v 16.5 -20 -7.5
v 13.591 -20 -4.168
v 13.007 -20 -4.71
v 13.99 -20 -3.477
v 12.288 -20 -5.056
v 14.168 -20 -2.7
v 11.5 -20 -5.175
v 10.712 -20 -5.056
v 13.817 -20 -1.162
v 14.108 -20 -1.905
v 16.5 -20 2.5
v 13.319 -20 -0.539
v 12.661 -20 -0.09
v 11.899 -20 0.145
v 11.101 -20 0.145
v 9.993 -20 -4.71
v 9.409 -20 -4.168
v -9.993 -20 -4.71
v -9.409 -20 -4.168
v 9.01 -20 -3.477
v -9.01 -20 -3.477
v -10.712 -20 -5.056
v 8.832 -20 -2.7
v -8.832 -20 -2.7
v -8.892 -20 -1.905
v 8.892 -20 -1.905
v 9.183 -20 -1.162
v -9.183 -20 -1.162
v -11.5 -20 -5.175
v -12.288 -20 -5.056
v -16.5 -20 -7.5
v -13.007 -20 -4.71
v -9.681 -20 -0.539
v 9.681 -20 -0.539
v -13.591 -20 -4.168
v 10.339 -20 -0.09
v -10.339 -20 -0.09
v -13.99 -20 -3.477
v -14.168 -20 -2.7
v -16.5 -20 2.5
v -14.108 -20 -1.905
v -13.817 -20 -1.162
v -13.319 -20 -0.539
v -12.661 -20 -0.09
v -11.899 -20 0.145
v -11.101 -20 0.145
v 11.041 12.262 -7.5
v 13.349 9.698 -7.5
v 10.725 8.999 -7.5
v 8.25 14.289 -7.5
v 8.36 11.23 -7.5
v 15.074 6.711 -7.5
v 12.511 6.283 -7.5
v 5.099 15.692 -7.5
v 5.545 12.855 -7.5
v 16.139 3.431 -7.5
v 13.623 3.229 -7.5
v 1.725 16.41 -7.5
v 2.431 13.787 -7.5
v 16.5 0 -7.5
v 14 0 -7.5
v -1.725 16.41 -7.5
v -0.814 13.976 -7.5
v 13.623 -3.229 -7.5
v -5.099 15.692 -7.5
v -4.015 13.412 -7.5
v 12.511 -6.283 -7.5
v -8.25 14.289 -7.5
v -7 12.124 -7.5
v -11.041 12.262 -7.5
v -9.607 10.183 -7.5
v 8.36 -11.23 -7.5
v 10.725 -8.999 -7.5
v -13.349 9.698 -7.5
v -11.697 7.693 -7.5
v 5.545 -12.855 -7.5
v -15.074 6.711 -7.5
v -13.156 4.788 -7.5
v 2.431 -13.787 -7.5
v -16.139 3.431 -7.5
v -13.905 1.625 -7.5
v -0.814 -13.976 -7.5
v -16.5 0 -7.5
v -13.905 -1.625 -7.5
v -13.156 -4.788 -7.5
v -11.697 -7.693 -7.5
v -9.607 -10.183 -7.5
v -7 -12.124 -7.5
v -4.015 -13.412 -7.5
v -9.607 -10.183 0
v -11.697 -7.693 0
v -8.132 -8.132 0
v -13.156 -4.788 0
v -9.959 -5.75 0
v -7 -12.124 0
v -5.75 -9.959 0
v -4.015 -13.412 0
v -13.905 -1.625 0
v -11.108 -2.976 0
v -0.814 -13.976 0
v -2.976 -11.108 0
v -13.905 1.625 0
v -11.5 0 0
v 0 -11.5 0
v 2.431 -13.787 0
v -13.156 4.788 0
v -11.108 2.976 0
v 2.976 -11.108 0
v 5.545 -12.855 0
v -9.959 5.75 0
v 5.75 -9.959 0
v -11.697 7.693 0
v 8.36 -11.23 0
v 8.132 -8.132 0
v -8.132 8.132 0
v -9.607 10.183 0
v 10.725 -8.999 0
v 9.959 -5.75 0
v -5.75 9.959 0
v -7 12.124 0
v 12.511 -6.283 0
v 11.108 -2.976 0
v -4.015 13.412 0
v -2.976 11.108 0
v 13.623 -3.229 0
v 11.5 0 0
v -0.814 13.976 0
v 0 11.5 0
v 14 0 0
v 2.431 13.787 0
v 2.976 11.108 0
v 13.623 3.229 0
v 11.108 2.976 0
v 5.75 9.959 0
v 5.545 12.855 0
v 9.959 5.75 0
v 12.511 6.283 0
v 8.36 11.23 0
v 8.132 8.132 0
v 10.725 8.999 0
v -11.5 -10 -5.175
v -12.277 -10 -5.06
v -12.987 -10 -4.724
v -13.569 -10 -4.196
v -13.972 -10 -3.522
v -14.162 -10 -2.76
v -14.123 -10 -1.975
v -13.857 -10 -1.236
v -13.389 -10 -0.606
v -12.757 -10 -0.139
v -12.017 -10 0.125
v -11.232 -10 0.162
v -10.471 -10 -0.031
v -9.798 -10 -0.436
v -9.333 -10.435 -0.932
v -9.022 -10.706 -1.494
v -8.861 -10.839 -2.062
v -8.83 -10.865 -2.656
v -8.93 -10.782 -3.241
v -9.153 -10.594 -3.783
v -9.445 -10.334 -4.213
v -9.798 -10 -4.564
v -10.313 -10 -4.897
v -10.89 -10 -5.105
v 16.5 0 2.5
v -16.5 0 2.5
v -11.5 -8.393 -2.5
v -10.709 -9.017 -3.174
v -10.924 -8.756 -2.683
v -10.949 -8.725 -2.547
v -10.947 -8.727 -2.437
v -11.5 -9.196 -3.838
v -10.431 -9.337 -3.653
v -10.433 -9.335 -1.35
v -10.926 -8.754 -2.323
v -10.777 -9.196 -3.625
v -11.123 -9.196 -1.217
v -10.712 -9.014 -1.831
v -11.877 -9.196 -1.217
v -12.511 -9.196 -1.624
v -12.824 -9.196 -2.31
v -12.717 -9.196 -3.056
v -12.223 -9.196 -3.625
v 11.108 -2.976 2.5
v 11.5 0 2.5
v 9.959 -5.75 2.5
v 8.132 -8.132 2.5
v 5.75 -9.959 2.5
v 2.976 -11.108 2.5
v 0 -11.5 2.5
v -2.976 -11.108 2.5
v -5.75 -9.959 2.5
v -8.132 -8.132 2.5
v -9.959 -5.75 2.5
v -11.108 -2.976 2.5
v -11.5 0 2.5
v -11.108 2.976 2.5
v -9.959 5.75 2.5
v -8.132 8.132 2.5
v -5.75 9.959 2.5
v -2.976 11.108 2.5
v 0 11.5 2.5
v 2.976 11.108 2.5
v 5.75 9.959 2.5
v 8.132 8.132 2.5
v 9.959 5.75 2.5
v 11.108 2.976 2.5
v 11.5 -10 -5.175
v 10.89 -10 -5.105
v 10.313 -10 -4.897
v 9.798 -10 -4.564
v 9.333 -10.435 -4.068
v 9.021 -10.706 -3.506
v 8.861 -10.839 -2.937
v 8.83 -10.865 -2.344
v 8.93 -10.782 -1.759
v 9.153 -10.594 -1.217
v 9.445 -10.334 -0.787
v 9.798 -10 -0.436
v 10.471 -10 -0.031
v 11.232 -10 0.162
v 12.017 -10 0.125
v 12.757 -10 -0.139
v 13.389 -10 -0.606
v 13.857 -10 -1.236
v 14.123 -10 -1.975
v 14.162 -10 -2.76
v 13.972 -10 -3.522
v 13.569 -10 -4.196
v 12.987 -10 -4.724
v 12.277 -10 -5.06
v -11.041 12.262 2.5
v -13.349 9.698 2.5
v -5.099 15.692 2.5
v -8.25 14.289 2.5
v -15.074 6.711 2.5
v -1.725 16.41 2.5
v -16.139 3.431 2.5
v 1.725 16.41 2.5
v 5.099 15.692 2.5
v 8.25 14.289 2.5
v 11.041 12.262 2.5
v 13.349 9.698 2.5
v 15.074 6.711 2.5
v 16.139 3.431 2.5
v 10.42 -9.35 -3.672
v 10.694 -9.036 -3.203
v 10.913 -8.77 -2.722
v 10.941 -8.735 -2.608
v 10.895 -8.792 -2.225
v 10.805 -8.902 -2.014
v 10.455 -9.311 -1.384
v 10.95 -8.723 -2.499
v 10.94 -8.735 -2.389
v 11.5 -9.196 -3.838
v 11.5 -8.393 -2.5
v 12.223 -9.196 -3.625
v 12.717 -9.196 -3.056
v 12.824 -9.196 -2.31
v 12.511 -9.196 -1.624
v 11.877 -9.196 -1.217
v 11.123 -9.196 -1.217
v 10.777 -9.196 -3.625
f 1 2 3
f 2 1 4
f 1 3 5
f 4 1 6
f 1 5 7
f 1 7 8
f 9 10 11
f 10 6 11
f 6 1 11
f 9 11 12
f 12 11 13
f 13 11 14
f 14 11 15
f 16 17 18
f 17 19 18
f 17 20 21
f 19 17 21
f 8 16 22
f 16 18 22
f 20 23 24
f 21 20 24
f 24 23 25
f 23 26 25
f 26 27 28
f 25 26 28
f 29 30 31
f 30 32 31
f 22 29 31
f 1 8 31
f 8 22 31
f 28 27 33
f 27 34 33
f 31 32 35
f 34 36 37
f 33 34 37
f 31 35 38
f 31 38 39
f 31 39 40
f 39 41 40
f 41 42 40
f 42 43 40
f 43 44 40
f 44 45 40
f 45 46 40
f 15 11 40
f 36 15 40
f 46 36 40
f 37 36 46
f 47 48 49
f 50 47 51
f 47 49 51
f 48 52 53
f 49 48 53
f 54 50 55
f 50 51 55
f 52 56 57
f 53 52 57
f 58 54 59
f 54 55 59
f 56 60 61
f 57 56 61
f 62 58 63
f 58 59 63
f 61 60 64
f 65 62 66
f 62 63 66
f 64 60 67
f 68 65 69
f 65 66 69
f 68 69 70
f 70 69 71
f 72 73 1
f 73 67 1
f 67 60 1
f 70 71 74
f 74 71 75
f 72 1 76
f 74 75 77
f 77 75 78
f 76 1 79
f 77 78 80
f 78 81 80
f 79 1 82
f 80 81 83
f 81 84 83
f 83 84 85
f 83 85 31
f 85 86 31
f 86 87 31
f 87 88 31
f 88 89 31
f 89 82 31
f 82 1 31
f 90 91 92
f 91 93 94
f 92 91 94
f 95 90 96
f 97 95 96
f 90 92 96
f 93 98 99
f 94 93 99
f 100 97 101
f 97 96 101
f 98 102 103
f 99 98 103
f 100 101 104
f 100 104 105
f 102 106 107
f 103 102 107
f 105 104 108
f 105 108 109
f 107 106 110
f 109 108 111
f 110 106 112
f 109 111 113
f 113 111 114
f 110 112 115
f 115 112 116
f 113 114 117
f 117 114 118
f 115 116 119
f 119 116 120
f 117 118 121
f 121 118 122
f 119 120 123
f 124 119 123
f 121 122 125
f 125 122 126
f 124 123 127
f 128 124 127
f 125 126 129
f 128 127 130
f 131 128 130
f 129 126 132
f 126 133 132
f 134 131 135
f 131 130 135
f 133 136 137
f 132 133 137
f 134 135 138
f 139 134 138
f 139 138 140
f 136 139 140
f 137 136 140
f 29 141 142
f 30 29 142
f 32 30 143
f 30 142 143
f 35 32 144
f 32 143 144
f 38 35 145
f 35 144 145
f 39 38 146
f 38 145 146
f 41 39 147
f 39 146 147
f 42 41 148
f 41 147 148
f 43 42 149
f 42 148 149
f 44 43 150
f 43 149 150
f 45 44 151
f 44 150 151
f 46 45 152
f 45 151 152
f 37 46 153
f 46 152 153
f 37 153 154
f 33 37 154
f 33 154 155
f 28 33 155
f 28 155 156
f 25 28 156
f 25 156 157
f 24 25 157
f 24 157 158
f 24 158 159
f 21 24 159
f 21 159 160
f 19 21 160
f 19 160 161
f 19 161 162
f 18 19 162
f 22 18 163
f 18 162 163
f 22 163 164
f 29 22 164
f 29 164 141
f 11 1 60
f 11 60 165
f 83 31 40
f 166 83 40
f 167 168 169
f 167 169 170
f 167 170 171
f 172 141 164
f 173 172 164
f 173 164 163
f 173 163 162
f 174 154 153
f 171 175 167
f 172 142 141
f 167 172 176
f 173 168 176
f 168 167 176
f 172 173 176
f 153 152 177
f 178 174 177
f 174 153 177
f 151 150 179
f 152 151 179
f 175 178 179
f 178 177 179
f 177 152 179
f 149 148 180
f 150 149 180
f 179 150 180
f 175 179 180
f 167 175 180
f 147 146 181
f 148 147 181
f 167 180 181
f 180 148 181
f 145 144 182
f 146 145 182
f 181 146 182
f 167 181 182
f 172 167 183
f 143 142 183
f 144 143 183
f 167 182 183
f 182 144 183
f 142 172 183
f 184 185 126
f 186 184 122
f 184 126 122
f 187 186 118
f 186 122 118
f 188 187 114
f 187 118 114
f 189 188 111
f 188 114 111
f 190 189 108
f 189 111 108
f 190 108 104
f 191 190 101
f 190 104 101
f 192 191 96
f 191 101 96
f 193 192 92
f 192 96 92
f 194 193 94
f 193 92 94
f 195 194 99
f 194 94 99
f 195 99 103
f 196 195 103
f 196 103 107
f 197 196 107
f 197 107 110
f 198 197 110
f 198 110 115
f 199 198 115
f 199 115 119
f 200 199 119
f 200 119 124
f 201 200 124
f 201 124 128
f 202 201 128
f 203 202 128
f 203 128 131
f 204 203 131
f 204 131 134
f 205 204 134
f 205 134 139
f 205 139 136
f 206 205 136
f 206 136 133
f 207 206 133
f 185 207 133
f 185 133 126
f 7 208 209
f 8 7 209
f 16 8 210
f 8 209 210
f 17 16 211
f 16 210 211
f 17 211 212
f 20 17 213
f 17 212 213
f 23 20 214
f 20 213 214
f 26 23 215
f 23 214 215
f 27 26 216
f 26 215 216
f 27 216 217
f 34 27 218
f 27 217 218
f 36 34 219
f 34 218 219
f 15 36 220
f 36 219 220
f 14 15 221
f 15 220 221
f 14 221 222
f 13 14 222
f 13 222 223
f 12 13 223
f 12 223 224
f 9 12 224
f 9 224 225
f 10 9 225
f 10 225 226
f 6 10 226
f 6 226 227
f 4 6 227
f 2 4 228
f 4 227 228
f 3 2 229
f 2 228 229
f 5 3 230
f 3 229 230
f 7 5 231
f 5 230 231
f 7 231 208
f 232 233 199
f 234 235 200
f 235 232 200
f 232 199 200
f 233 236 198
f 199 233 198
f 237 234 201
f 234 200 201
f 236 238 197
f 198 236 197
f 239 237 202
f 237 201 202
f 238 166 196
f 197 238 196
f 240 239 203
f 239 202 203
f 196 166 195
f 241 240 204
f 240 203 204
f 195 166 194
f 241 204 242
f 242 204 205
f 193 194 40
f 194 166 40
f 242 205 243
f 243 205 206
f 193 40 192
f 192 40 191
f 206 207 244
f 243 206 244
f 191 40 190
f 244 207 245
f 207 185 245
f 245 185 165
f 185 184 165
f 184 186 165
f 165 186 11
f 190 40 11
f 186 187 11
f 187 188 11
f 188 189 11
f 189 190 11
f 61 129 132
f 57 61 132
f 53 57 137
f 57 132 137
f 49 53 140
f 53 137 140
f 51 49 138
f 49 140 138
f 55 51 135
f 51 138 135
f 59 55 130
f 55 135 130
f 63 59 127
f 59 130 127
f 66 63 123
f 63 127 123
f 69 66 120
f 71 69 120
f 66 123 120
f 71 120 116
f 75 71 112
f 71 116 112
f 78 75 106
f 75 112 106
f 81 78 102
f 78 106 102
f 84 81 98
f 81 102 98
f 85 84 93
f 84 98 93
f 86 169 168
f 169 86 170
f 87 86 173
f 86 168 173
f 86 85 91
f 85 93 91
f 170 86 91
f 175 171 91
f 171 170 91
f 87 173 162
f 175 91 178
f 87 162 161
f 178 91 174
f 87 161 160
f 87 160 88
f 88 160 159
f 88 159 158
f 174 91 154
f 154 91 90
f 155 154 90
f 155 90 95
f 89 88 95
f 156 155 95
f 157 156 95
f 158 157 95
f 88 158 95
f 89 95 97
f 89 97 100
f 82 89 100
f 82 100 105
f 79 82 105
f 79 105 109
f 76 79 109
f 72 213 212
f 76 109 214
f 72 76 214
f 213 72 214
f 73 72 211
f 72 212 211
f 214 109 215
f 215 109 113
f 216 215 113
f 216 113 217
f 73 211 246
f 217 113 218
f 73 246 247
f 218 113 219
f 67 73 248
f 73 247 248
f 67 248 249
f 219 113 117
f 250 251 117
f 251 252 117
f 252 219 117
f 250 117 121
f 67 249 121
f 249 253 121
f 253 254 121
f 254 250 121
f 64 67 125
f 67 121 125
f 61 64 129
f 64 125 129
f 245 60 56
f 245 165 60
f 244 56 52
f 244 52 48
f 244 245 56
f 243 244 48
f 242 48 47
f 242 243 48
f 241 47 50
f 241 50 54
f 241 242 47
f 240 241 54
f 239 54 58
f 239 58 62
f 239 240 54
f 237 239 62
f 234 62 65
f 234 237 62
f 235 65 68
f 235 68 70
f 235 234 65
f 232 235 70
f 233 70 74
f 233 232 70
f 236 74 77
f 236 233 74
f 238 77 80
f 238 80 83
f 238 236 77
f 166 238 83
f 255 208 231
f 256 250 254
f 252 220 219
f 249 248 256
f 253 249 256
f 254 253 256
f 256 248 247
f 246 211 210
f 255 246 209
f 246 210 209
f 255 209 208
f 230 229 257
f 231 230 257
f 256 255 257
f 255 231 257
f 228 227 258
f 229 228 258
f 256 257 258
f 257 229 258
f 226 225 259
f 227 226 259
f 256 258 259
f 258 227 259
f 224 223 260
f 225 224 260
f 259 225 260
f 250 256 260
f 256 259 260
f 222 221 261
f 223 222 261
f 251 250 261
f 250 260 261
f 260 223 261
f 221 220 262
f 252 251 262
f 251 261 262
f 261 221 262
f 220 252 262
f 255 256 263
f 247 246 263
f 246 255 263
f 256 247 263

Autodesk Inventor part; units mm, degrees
ref_plane "YZ Plane" through (0, 0, 0) normal (1, 0, 0) x (0, 1, 0)
ref_plane "XY Plane" through (0, 0, 0) normal (0, 0, 1) x (1, 0, 0)
sketch "Sketch1" plane through (0, 0, 0) normal (0, 0, 1) x (1, 0, 0)
  circle A0 centre (0, 0) radius 14
  circle A1 centre (0, 0) radius 16.5
  circle A2 centre (0, 0) radius 11.5
  dimension "d0" = 28
  dimension "d1" = 33
  dimension "d2" = 23
extrude "Extrusion1" add sketch "Sketch1" along normal blind 2.5 contours A0 | A1
extrude "Extrusion2" add sketch "Sketch1" against normal blind 7.5 contours A1
ref_plane "Work Plane1" through (0, -20, 0) normal (0, 1, 0) x (-1, 0, 0)
sketch "Sketch2" plane through (0, -20, 0) normal (0, 1, 0) x (-1, 0, 0)
  line L0 (-16.5, -7.5) -> (16.5, -7.5) projected
  line L1 (16.5, 2.5) -> (-16.5, 2.5) projected
  line L2 (16.5, -7.5) -> (16.5, 2.5) projected
  line L3 (-16.5, -7.5) -> (-16.5, 2.5) projected
  line L4 (-16.5, 2.5) -> (-26.5, 2.5)
  line L5 (-26.5, 2.5) -> (-26.5, -7.5)
  line L6 (-26.5, -7.5) -> (-16.5, -7.5)
  line L7 (-16.5, -7.5) -> (-16.5, 2.5)
  line L8 (16.5, 2.5) -> (26.5, 2.5)
  line L9 (26.5, 2.5) -> (26.5, -7.5)
  line L10 (26.5, -7.5) -> (16.5, -7.5)
  line L11 (16.5, -7.5) -> (16.5, 2.5)
  point P0 (0, 0)
  dimension "d8" = 10
  dimension "d9" = 10
  dimension "d10" = 10
  dimension "d11" = 10
extrude "Extrusion3" add sketch "Sketch2" along normal blind 20 contours L3 L1 L2 L0
delete faces "Delete Face1" heal yes whole lump no faces at (-3.8333, 0, -5)
extrude "Extrusion4" [suppressed]
sketch "Sketch3" plane through (0, -20, 0) normal (0, -1, 0) x (1, 0, 0)
  line L0 (-16.5, -7.5) -> (-16.5, 2.5) projected
  line L1 (16.5, 2.5) -> (16.5, -7.5) projected
  point P0 (0, 0)
  point P1 (-11.5, -2.5)
  point P2 (11.5, -2.5)
  point P3 (16.5, -2.5)
  point P4 (-16.5, -2.5)
  dimension "d23" = 5
  dimension "d24" = 5
hole "Hole1" at (-11.5, -20, -2.5) at (11.5, -20, -2.5) direction (0, 1, 0) diameter 5.35 depth 10 tip angle 118
properties part number "Adafruit_1528_4699_ND_House_02"
